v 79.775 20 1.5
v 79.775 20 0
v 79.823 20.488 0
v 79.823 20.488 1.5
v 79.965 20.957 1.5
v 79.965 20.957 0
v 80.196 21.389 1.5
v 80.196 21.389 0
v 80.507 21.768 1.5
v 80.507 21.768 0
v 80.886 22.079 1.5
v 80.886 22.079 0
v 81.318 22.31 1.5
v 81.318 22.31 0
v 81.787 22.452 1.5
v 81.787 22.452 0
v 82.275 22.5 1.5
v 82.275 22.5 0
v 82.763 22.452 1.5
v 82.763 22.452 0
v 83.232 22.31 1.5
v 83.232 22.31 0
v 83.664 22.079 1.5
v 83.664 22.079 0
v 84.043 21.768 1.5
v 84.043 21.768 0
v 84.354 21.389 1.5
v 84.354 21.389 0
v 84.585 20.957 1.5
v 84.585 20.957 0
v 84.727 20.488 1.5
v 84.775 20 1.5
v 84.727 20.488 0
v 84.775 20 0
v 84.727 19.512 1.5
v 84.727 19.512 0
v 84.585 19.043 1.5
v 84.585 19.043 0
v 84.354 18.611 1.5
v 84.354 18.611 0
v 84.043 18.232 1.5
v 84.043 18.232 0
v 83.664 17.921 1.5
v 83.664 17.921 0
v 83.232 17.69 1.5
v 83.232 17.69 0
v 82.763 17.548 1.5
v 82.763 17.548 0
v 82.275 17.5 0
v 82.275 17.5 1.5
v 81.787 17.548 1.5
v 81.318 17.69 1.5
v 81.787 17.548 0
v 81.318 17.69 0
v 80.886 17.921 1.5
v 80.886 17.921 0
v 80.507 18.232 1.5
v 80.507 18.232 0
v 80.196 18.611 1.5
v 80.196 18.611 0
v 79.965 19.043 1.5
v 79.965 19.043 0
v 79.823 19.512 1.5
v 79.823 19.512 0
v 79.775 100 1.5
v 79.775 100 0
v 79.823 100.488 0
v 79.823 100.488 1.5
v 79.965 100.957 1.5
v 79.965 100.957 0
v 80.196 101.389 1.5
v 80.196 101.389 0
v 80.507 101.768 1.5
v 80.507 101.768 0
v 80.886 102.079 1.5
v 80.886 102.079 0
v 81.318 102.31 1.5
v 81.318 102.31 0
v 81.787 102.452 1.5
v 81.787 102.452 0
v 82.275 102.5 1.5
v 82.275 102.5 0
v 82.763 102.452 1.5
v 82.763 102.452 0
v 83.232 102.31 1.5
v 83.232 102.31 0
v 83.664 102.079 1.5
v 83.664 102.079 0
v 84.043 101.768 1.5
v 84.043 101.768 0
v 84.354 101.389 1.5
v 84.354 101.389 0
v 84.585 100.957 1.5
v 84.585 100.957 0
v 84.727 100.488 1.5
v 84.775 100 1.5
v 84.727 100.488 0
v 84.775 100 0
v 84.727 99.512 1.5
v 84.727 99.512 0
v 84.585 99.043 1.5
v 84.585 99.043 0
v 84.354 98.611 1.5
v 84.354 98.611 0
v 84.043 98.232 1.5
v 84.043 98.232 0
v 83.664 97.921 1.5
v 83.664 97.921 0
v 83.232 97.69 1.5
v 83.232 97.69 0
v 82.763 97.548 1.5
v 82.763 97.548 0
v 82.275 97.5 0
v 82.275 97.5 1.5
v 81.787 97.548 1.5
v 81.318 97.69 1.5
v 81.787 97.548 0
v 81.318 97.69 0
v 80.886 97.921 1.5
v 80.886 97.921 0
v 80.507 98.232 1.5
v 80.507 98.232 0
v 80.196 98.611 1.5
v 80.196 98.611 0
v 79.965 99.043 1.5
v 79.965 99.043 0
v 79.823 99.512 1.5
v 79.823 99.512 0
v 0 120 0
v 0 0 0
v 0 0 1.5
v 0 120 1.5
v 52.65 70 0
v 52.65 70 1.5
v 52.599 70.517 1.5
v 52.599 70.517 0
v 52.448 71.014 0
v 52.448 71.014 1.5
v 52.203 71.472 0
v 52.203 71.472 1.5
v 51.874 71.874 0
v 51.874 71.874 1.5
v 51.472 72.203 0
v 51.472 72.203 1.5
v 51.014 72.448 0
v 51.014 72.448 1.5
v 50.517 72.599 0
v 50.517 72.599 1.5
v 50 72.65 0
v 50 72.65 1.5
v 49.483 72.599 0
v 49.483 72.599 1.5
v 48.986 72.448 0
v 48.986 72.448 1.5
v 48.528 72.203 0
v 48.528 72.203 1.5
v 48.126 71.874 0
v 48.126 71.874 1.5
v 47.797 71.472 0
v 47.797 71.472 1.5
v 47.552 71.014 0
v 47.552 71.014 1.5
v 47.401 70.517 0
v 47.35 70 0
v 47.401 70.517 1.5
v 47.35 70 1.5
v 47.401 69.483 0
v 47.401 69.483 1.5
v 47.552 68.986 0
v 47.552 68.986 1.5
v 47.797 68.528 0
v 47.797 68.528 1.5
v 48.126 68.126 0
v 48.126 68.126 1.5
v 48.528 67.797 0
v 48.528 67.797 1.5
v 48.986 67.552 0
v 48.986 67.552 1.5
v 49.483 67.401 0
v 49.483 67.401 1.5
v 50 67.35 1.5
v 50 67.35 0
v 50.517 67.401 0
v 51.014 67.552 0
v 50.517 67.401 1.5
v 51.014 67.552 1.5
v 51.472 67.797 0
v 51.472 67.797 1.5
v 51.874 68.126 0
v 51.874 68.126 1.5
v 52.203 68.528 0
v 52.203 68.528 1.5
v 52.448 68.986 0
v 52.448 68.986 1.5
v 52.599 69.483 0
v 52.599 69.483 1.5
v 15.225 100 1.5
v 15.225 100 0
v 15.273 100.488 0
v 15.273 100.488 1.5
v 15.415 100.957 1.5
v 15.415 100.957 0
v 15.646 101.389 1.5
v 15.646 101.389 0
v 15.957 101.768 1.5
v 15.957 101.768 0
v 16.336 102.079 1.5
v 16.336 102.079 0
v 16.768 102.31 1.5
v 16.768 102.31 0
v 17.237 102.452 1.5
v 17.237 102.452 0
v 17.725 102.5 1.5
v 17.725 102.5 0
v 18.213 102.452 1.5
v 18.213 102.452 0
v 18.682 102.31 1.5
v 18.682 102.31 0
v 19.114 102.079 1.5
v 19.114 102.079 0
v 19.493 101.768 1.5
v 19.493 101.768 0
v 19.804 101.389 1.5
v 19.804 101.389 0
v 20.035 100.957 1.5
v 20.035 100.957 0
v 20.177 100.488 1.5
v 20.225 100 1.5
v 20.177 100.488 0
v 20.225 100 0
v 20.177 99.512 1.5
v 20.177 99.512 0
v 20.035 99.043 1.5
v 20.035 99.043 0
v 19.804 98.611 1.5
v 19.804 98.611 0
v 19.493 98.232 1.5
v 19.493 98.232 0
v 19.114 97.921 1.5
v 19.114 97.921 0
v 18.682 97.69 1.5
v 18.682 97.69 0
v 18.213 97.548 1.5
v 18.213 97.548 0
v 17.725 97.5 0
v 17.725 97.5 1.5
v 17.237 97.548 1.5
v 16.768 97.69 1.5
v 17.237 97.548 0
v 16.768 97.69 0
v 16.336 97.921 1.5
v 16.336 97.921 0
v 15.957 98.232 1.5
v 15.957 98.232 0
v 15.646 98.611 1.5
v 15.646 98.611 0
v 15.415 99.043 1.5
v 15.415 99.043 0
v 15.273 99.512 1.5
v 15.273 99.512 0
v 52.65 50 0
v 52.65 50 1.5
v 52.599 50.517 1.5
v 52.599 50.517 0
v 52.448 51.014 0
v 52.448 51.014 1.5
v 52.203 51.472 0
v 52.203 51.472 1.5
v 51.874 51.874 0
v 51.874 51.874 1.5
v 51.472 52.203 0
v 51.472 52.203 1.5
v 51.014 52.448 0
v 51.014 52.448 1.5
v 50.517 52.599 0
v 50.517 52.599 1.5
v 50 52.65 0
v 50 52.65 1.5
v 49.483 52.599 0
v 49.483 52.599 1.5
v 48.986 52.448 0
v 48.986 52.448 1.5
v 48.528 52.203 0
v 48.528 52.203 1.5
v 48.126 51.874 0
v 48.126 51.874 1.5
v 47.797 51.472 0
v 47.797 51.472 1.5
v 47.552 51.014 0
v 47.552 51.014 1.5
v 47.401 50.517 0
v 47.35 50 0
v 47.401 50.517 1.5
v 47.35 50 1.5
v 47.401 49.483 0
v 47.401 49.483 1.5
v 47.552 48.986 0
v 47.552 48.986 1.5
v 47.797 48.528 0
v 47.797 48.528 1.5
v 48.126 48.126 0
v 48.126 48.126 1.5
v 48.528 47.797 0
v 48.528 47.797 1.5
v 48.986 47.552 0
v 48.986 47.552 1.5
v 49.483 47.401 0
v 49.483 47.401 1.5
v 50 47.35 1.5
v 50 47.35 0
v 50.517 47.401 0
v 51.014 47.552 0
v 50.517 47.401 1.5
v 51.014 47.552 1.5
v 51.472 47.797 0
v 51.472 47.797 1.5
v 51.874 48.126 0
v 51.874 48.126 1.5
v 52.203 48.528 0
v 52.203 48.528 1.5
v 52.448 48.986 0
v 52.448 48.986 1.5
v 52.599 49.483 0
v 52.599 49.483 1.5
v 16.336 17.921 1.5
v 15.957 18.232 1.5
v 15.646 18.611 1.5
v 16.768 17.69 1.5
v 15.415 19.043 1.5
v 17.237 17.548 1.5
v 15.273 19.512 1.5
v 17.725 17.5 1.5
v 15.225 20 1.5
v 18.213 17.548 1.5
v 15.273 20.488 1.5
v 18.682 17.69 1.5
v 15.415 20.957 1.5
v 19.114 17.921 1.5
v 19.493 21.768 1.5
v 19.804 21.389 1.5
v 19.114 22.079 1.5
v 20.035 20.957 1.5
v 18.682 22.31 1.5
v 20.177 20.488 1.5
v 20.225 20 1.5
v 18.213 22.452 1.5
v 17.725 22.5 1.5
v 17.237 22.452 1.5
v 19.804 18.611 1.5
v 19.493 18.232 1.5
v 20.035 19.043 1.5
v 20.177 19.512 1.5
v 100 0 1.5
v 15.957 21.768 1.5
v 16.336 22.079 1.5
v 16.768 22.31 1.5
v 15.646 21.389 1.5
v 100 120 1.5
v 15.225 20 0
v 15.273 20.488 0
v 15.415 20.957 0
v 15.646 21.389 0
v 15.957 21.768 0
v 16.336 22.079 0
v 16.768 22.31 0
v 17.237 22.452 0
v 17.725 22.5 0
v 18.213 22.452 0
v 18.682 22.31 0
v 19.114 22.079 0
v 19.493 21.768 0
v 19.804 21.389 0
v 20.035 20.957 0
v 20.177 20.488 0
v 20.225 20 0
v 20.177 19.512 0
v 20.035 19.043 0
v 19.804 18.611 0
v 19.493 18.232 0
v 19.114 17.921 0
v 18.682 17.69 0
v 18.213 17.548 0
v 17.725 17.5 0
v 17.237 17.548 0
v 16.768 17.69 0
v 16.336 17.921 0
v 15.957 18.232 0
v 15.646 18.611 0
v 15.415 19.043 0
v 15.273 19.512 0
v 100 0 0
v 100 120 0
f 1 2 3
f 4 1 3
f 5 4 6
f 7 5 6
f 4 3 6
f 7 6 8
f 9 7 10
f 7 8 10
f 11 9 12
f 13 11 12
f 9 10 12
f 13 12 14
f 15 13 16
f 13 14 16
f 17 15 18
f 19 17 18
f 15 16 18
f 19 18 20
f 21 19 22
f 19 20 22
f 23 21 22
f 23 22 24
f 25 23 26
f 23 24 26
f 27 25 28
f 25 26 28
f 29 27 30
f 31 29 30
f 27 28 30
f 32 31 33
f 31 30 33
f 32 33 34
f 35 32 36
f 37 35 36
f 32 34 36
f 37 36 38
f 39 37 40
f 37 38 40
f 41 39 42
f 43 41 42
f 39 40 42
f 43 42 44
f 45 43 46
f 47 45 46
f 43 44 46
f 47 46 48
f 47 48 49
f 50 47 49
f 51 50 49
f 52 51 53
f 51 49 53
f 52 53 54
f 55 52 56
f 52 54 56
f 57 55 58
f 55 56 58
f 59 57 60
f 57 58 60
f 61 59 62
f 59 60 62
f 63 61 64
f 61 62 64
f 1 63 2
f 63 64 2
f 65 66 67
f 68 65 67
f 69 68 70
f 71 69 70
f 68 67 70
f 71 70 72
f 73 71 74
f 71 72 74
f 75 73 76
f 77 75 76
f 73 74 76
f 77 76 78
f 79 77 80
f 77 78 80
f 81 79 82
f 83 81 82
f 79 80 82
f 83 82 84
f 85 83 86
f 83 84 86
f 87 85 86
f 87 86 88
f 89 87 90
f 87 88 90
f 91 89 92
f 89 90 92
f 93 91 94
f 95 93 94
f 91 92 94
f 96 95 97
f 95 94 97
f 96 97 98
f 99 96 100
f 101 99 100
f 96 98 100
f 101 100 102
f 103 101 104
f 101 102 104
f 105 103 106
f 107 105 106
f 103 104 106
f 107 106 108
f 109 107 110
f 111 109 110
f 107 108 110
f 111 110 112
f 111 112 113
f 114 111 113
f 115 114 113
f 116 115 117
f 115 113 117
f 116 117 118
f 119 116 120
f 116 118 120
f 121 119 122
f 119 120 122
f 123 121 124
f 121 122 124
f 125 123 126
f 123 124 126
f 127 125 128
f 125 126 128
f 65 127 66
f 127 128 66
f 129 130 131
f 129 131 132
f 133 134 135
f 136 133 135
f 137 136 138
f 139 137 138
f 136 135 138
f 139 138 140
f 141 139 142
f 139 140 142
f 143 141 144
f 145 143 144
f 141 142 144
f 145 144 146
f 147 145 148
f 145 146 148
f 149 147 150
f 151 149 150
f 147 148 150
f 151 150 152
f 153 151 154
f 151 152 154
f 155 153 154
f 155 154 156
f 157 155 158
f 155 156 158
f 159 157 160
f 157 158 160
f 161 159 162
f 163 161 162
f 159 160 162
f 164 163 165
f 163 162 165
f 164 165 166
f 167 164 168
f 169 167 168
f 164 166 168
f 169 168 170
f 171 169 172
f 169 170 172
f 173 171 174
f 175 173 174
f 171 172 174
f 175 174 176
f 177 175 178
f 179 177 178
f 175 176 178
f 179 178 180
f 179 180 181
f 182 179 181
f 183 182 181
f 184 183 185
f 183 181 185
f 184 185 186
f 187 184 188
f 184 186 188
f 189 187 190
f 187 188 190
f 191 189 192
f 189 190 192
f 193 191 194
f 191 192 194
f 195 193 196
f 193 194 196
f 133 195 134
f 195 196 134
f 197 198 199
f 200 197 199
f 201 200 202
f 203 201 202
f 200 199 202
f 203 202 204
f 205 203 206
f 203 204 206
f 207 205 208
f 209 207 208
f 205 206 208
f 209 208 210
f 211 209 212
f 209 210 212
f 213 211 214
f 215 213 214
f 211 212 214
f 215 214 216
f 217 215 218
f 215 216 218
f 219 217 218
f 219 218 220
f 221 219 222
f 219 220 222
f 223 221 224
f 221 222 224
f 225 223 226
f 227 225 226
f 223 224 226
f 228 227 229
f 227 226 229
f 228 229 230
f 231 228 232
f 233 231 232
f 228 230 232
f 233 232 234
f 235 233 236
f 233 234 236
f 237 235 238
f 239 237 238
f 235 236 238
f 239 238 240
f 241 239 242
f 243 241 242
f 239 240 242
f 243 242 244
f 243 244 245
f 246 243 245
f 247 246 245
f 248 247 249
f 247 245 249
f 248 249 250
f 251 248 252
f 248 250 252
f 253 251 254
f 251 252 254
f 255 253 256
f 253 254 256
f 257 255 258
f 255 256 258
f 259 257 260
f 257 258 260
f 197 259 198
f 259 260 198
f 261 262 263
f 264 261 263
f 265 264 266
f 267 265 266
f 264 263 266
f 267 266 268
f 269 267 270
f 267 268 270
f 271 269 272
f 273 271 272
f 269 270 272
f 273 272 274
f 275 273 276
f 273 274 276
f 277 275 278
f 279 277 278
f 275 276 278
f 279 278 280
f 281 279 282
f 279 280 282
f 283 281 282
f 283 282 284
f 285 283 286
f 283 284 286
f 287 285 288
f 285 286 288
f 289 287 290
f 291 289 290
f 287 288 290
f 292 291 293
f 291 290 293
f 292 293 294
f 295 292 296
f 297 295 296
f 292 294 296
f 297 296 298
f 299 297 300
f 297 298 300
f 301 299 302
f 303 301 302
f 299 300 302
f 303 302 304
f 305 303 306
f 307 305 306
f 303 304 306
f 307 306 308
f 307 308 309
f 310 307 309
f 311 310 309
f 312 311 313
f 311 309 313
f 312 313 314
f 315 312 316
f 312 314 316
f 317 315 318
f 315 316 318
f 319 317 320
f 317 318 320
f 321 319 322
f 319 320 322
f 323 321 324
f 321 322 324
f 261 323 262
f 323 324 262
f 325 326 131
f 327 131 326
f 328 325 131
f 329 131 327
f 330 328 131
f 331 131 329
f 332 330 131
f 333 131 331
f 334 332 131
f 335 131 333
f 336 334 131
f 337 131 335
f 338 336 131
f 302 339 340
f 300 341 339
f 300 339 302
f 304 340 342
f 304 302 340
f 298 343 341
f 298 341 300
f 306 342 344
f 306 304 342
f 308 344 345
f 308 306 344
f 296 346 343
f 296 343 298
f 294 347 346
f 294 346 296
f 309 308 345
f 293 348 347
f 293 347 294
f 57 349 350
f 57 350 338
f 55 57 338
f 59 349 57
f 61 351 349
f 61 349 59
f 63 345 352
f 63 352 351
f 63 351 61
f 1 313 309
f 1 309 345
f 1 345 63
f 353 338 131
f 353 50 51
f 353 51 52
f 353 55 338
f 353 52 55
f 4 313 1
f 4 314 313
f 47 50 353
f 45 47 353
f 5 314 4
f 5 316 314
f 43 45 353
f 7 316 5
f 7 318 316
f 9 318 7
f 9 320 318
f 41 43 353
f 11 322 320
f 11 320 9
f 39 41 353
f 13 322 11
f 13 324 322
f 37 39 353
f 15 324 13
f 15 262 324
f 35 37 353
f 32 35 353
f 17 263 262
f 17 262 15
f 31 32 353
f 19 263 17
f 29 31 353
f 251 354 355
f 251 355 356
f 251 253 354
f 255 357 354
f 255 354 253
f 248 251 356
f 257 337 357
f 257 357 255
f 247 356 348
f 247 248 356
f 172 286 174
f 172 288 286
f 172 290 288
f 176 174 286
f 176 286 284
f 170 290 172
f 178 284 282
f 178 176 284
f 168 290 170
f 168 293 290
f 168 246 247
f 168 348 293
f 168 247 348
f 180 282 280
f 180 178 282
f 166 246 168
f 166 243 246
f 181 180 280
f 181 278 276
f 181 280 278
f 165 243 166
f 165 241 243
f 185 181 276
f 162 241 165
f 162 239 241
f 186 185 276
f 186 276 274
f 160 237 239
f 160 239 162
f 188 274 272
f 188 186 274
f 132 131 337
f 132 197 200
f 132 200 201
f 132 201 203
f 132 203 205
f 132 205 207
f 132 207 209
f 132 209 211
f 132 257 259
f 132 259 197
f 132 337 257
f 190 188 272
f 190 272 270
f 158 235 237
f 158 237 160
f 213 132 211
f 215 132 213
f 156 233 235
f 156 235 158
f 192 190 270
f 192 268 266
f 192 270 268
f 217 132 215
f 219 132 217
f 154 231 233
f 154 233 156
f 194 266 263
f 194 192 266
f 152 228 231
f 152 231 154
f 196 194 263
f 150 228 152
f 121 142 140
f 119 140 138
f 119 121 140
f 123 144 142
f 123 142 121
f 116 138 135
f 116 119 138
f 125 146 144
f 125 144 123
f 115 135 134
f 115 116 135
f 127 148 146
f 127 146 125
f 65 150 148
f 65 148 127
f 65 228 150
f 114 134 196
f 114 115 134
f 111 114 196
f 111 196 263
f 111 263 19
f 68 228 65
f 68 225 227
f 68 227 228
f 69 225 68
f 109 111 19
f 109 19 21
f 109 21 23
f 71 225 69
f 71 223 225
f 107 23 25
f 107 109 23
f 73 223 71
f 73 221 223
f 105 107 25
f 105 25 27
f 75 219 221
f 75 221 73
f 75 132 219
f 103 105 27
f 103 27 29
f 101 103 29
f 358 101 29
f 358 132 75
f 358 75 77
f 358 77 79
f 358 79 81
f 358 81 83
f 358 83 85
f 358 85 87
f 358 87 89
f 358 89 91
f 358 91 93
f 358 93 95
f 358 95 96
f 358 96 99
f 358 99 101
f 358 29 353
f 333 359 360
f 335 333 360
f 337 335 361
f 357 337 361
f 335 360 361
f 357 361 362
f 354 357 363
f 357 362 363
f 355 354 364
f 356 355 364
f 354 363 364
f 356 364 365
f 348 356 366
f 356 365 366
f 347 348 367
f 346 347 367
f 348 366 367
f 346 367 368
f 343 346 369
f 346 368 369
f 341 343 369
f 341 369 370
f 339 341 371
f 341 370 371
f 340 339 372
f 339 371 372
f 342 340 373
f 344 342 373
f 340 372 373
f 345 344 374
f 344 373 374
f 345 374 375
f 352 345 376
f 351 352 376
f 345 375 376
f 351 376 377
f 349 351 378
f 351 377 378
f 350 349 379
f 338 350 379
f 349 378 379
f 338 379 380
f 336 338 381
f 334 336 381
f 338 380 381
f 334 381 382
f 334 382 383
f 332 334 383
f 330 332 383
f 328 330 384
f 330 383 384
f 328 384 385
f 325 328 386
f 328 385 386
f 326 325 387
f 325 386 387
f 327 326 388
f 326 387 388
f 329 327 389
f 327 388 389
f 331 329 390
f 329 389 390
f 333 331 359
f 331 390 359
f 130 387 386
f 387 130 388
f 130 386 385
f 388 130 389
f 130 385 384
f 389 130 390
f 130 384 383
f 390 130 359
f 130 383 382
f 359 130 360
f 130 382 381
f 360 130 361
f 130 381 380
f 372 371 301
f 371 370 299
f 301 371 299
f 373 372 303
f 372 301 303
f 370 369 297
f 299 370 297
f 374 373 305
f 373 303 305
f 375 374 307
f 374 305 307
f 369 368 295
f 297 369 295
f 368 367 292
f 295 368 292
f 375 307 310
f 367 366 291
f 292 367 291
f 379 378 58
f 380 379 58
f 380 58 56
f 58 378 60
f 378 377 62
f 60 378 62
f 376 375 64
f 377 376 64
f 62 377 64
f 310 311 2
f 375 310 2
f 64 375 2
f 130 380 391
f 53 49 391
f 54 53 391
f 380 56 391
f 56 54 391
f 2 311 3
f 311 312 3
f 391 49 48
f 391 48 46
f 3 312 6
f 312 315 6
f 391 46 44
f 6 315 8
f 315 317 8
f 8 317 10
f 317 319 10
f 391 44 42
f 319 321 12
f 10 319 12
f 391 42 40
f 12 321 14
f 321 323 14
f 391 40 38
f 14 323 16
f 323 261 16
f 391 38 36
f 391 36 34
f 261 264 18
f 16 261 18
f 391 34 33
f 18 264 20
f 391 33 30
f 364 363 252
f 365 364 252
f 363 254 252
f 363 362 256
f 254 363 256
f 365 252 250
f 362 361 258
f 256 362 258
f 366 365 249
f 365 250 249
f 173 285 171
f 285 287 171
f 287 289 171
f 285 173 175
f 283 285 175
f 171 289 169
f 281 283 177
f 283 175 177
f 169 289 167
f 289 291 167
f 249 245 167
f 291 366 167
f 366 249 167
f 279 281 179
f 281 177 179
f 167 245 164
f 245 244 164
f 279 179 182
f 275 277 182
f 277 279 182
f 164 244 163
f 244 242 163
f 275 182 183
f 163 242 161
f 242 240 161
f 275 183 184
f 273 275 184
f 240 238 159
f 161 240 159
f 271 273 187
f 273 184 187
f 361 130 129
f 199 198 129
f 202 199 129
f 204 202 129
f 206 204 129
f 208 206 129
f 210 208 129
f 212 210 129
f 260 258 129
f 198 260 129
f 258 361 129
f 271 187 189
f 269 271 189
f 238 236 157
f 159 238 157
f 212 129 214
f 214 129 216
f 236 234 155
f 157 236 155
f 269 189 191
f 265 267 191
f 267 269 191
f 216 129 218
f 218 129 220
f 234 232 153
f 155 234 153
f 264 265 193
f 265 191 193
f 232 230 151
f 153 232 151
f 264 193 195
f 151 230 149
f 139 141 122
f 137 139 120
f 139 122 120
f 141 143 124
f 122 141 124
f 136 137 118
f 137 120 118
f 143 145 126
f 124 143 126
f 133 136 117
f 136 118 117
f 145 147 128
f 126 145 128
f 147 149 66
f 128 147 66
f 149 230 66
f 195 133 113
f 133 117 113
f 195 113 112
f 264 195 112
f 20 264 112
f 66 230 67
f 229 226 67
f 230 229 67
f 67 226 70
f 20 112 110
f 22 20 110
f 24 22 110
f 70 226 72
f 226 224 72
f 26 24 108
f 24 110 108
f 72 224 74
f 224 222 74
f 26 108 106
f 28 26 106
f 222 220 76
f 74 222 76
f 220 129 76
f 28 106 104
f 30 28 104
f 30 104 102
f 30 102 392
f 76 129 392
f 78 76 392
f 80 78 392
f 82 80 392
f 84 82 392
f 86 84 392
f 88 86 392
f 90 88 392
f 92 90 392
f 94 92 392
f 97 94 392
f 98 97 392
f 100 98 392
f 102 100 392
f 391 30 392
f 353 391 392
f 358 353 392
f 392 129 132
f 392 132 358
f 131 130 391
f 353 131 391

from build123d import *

# Parameters (mm, degrees)
SKETCH1_W           = 100
SKETCH1_H           = 120
BOSS_EXTRUDE1_DEPTH = 1.5
SKETCH2_R           = 2.5
CUT_EXTRUDE1_DEPTH  = 1.5
SKETCH4_R           = 2.65
CUT_EXTRUDE2_DEPTH  = 1.5


with BuildPart() as part:
    # Sketch1 → Boss-Extrude1 (new body)
    with BuildSketch(Plane.XY):
        with Locations((50, 60)):
            Rectangle(SKETCH1_W, SKETCH1_H)
    extrude(amount=BOSS_EXTRUDE1_DEPTH)

    # Sketch2 → Cut-Extrude1 (cut)
    with BuildSketch(Plane(origin=(0, 0, 0), x_dir=(-1, 0, 0), z_dir=(0, 0, -1))):
        with Locations((-82.275, 20)):
            Circle(SKETCH2_R)
        with Locations((-17.725, 20)):
            Circle(SKETCH2_R)
        with Locations((-17.725, 100)):
            Circle(SKETCH2_R)
        with Locations((-82.275, 100)):
            Circle(SKETCH2_R)
    extrude(amount=-CUT_EXTRUDE1_DEPTH, mode=Mode.SUBTRACT)

    # Sketch4 → Cut-Extrude2 (cut)
    with BuildSketch(Plane.XY.offset(1.5)):
        with Locations((50, 50)):
            Circle(SKETCH4_R)
        with Locations((50, 70)):
            Circle(SKETCH4_R)
    extrude(amount=-CUT_EXTRUDE2_DEPTH, mode=Mode.SUBTRACT)


solid = part.part
